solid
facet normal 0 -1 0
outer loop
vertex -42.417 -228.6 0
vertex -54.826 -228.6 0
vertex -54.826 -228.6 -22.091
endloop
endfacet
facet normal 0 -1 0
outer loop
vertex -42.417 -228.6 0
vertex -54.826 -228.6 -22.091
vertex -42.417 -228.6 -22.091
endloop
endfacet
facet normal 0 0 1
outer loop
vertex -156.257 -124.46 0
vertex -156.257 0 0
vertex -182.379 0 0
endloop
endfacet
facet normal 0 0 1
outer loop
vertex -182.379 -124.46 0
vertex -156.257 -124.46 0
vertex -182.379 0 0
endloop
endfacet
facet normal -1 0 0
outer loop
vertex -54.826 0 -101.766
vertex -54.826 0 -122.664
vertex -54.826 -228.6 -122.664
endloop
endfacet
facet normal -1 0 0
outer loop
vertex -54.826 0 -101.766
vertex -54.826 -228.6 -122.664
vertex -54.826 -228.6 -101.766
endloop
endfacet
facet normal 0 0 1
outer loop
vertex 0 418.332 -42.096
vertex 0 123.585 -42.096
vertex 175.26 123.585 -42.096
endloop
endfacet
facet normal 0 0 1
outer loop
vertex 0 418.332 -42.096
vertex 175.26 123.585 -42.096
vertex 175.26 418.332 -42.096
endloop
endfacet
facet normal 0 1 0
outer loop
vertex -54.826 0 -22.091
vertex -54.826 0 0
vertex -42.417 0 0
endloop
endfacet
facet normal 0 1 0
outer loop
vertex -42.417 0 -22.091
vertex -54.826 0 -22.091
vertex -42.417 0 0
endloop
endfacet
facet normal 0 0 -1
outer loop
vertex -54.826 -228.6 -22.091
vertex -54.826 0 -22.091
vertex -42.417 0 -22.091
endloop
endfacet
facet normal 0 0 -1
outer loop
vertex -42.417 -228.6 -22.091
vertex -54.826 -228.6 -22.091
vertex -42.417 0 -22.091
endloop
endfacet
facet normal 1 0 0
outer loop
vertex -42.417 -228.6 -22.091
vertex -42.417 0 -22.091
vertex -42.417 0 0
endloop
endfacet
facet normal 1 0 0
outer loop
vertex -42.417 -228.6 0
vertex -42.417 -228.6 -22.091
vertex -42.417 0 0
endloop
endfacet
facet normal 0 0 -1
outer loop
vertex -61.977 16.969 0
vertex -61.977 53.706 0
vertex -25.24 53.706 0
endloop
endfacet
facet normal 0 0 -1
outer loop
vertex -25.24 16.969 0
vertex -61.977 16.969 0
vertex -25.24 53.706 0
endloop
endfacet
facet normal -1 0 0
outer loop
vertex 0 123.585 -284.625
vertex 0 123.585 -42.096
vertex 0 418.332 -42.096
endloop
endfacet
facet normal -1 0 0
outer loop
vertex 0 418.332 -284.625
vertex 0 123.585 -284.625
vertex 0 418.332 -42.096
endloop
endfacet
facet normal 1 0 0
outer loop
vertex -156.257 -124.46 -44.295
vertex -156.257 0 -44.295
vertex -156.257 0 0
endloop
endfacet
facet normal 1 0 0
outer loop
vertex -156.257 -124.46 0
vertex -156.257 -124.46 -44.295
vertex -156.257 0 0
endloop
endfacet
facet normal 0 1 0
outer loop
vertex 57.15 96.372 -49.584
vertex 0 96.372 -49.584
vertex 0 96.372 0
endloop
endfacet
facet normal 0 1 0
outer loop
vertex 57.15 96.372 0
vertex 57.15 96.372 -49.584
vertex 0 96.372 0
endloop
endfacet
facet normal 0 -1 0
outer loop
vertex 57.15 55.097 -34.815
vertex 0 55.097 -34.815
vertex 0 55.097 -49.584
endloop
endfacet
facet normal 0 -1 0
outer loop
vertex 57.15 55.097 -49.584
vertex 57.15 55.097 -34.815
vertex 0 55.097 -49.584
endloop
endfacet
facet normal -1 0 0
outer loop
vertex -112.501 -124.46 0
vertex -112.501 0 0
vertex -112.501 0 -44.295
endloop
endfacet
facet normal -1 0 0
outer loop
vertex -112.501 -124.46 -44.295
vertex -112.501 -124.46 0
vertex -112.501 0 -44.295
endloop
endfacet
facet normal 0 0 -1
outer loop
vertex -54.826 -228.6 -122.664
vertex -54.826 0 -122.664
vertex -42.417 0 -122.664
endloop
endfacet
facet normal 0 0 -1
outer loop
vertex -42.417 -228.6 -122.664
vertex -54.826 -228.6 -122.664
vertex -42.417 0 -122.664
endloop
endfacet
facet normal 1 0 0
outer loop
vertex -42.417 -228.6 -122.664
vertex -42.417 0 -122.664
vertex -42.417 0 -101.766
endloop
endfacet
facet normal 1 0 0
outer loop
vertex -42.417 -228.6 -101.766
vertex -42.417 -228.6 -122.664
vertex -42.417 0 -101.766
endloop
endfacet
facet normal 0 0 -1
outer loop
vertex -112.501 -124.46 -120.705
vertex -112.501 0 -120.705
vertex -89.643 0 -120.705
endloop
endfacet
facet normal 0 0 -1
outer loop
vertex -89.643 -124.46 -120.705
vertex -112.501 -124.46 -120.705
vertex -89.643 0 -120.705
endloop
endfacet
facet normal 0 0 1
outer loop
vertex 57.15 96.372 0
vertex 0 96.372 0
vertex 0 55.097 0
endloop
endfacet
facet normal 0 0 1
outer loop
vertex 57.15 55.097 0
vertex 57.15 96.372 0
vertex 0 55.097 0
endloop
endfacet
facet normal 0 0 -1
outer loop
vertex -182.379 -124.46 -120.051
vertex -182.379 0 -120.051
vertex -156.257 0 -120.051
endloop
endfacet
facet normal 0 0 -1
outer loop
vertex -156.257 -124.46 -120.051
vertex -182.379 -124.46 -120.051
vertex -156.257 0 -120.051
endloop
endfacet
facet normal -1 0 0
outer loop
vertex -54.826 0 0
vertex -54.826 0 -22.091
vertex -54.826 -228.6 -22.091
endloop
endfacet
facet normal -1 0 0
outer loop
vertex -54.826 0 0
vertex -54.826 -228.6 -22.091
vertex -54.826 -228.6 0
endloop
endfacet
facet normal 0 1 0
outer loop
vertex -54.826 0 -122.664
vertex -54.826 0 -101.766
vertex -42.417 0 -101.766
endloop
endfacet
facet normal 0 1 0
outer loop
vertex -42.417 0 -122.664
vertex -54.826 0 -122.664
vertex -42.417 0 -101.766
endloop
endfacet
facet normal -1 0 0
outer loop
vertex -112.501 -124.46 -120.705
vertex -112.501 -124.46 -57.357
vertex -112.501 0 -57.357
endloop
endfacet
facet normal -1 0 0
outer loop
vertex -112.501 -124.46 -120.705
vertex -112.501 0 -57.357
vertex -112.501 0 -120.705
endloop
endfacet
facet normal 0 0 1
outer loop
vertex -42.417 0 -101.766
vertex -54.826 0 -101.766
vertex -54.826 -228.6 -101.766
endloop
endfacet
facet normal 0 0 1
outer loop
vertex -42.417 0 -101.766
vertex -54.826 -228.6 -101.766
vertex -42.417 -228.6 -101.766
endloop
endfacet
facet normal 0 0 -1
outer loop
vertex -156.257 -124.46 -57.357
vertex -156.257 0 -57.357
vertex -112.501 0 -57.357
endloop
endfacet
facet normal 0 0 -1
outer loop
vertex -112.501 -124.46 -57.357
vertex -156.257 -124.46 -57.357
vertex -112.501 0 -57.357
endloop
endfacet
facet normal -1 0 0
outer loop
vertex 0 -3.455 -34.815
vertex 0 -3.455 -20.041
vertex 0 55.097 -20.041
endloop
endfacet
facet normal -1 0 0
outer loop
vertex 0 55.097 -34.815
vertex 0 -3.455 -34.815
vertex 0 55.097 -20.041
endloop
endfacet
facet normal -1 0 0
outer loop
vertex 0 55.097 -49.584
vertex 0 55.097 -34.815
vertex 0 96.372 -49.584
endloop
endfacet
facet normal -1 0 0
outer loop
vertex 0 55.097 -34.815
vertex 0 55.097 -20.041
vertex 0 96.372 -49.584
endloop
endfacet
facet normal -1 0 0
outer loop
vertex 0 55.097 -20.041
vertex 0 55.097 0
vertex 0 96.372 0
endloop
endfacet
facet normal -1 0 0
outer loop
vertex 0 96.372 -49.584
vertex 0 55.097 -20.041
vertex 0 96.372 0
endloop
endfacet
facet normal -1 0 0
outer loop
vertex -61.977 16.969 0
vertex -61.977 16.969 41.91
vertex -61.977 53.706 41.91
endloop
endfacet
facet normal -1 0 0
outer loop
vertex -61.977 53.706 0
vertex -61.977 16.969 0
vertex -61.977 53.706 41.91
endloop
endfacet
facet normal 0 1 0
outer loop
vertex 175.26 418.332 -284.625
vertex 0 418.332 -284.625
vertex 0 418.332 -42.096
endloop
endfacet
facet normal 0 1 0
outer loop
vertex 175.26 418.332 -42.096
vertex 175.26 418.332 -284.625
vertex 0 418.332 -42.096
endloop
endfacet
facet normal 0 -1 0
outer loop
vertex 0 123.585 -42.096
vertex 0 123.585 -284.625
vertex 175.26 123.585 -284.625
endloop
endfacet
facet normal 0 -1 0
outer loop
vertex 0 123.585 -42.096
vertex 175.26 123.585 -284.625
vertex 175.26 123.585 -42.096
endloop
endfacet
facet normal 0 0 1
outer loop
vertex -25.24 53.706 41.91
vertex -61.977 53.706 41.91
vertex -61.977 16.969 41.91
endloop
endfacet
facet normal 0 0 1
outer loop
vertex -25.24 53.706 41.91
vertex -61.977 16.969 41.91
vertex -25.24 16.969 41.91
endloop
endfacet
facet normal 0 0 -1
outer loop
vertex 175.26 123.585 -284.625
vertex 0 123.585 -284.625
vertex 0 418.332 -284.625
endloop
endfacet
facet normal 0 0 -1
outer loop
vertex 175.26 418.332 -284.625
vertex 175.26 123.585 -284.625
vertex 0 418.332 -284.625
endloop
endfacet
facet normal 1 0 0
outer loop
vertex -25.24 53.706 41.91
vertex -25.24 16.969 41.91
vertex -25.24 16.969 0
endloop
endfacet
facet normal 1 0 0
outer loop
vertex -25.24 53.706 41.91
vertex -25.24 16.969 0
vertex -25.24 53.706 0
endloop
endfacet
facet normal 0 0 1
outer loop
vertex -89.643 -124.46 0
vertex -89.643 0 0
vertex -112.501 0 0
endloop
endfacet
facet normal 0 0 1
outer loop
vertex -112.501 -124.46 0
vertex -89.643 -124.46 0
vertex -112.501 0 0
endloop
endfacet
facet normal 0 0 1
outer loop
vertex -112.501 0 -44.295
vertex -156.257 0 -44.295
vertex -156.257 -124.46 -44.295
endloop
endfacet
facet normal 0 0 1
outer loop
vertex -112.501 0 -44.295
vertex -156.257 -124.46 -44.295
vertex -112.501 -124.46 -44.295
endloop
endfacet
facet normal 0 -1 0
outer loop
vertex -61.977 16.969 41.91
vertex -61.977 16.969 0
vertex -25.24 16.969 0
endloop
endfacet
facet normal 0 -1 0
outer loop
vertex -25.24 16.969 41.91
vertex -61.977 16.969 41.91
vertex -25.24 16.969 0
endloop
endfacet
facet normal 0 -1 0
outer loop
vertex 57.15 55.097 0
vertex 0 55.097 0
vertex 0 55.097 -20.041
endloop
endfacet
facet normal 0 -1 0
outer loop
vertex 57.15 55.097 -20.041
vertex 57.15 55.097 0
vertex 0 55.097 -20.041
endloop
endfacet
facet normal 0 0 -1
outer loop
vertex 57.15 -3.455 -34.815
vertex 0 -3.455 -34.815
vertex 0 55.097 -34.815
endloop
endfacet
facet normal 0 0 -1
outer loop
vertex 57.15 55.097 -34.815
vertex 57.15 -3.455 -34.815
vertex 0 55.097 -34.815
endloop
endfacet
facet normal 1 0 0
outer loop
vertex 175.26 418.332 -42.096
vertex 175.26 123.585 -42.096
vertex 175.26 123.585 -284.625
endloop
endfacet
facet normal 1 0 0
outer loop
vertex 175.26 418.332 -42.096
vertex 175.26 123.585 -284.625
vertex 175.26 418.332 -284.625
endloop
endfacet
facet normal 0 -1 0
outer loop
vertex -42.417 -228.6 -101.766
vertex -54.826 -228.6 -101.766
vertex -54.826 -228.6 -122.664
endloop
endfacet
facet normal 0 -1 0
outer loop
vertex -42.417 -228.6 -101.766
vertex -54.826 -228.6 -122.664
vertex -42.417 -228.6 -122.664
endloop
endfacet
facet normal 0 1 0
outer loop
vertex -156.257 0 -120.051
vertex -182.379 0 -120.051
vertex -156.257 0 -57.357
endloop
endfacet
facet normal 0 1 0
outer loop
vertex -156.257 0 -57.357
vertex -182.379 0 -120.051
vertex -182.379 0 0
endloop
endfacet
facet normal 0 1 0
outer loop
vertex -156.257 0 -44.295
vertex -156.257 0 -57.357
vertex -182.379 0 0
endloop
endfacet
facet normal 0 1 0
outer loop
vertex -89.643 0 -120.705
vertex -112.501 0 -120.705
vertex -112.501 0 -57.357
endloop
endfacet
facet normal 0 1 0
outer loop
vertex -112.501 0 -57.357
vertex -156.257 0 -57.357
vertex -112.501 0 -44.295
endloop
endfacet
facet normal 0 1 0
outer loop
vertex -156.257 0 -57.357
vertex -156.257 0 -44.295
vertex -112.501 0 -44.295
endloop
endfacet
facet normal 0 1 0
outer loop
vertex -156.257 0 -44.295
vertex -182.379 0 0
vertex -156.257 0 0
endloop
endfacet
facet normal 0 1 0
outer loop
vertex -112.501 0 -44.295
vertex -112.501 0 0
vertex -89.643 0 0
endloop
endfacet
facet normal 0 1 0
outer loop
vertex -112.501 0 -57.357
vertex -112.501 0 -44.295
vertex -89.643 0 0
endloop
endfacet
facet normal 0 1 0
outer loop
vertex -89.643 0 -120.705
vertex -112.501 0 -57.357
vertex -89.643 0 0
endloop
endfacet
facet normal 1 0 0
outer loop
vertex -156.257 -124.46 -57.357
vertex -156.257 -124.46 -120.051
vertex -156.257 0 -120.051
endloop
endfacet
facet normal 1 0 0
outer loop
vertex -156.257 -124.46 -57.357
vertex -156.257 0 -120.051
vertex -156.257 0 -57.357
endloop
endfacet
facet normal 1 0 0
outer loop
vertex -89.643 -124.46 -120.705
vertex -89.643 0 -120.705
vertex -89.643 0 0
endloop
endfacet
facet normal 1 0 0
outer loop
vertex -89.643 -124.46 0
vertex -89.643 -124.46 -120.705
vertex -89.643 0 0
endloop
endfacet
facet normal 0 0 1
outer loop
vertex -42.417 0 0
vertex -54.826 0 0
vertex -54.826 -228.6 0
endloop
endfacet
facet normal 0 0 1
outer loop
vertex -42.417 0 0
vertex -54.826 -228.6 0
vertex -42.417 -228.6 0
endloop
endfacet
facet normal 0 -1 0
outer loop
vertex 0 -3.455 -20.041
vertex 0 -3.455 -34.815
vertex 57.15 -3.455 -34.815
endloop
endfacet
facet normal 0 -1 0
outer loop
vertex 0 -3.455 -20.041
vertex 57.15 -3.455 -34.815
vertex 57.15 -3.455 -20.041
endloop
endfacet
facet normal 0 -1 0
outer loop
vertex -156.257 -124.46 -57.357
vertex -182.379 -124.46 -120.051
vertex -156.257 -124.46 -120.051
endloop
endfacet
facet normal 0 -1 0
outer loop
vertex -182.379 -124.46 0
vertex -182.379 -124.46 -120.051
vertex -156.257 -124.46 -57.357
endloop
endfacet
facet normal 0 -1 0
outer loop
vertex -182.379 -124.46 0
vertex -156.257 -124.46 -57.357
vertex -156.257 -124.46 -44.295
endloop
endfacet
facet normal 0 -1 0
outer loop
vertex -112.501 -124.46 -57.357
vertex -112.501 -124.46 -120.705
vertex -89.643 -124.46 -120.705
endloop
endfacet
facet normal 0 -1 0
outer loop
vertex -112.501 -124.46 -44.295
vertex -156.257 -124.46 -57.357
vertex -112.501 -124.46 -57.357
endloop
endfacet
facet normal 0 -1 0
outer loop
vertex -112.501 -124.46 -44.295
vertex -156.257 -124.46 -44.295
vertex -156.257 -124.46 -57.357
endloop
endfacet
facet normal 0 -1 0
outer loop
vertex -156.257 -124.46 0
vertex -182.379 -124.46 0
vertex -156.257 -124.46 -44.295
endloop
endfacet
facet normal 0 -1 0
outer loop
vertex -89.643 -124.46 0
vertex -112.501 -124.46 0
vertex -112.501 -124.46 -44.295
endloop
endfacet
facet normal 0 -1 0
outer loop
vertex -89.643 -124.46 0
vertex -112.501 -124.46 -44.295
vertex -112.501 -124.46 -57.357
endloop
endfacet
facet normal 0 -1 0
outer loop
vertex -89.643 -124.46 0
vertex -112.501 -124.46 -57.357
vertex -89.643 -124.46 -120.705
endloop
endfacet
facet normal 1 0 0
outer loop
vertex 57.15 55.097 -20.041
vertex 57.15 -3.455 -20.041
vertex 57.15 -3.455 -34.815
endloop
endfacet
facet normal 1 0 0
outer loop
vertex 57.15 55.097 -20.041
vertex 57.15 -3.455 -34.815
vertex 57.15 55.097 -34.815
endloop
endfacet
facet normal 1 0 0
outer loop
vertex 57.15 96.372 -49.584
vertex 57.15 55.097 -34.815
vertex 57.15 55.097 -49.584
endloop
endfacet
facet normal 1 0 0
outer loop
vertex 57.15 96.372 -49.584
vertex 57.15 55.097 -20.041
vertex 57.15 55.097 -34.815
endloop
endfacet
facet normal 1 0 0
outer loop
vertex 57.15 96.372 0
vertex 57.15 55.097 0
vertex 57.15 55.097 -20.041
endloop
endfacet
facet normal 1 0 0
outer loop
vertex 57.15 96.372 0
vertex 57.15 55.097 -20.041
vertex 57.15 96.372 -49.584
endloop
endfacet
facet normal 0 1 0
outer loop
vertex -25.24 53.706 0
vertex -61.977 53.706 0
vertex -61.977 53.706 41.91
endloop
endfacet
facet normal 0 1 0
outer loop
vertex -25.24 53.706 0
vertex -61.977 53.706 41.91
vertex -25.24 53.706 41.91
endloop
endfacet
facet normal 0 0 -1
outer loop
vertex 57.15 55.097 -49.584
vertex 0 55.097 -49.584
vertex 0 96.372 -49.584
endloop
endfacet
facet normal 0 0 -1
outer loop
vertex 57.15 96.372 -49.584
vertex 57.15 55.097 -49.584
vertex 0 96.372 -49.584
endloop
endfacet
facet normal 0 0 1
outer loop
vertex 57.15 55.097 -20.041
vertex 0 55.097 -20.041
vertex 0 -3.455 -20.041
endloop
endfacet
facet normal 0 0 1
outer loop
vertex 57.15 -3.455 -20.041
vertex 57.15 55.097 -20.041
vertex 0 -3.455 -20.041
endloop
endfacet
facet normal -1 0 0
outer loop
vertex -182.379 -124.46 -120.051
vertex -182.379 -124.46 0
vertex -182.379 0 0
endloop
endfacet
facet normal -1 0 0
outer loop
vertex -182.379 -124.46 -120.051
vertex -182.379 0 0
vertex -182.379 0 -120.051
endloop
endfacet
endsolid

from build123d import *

# Parameters (mm, degrees)
F0_W      = 36.7371924222
F0_H      = 36.7371905595
F1_DEPTH  = 41.91
F3_W      = 18.7610238791
F3_H      = 14.7736519575
F3_W_2    = 9.7653195262
F3_W_3    = 48.7866785843
F4_DEPTH  = 57.15
F5_W      = 294.7466820478
F5_H      = 242.5296194851
F6_DEPTH  = 175.26
F7_W      = 43.7557250261
F7_H      = 13.0614079535
F7_W_2    = 7.1837753057
F7_W_3    = 15.6736895442
F8_DEPTH  = 124.46
F9_W      = 12.4083422124
F9_H      = 22.0909118652
F10_DEPTH = 228.6
F9_H_2    = 20.8982601762


with BuildPart() as f1:
    # F0 (on Top) → F1 (new body)
    with BuildSketch(Plane.XY):
        with Locations((-43.608693406, 35.337745212)):
            Rectangle(F0_W, F0_H)
    extrude(amount=F1_DEPTH)


with BuildPart() as f4:
    # F3 (on face) → F4 (new body)
    with BuildSketch(Plane.YZ):
        Polygon((96.3715314865, 0), (55.0972893834, 0), (55.0972893834, -20.0410559773), (73.8583132625, -20.0410559773), (73.8583132625, -34.8147079349), (55.0972893834, -34.8147079349), (55.0972893834, -49.5837777853), (96.3715314865, -49.5837777853), align=None)
        with Locations((64.4778013229, -27.4278819561)):
            Rectangle(F3_W, F3_H)
        with Locations((50.2146296203, -27.4278819561)):
            Rectangle(F3_W_2, F3_H)
        with Locations((20.9386305651, -27.4278819561)):
            Rectangle(F3_W_3, F3_H)
    extrude(amount=F4_DEPTH)


with BuildPart() as f6:
    # F5 (on Right) → F6 (new body)
    with BuildSketch(Plane.YZ):
        with Locations((270.9584012628, -163.3604522794)):
            Rectangle(F5_W, F5_H)
    extrude(amount=F6_DEPTH)


with BuildPart() as f8:
    # F7 (on Front) → F8 (new body)
    with BuildSketch(Plane.XZ):
        Polygon((-156.2565118074, -44.2953109741), (-156.2565118074, 0), (-182.379335165, 0), (-182.379335165, -120.0514882803), (-156.2565118074, -120.0514882803), (-156.2565118074, -57.3567189276), (-163.4402871132, -57.3567189276), (-163.4402871132, -44.2953109741), align=None)
        with Locations((-134.3786492944, -50.8260149509)):
            Rectangle(F7_W, F7_H)
        with Locations((-159.8483994603, -50.8260149509)):
            Rectangle(F7_W_2, F7_H)
        Polygon((-112.5007867813, 0), (-112.5007867813, -44.2953109741), (-96.8270972371, -44.2953109741), (-96.8270972371, -57.3567189276), (-112.5007867813, -57.3567189276), (-112.5007867813, -120.7045614719), (-89.6433219314, -120.7045614719), (-89.6433219314, 0), align=None)
        with Locations((-104.6639420092, -50.8260149509)):
            Rectangle(F7_W_3, F7_H)
    extrude(amount=F8_DEPTH)


with BuildPart() as f10:
    # F9 (on Front) → F10 (new body)
    with BuildSketch(Plane.XZ):
        with Locations((-48.6215297133, -11.0454559326)):
            Rectangle(F9_W, F9_H)
    extrude(amount=F10_DEPTH)


with BuildPart() as f10b:
    # F9 (on Front) → F10, piece 2 (new body)
    with BuildSketch(Plane.XZ):
        with Locations((-48.6215297133, -112.2146435082)):
            Rectangle(F9_W, F9_H_2)
    extrude(amount=F10_DEPTH)


solid = Compound([f1.part, f4.part, f6.part, f8.part, f10.part, f10b.part])
